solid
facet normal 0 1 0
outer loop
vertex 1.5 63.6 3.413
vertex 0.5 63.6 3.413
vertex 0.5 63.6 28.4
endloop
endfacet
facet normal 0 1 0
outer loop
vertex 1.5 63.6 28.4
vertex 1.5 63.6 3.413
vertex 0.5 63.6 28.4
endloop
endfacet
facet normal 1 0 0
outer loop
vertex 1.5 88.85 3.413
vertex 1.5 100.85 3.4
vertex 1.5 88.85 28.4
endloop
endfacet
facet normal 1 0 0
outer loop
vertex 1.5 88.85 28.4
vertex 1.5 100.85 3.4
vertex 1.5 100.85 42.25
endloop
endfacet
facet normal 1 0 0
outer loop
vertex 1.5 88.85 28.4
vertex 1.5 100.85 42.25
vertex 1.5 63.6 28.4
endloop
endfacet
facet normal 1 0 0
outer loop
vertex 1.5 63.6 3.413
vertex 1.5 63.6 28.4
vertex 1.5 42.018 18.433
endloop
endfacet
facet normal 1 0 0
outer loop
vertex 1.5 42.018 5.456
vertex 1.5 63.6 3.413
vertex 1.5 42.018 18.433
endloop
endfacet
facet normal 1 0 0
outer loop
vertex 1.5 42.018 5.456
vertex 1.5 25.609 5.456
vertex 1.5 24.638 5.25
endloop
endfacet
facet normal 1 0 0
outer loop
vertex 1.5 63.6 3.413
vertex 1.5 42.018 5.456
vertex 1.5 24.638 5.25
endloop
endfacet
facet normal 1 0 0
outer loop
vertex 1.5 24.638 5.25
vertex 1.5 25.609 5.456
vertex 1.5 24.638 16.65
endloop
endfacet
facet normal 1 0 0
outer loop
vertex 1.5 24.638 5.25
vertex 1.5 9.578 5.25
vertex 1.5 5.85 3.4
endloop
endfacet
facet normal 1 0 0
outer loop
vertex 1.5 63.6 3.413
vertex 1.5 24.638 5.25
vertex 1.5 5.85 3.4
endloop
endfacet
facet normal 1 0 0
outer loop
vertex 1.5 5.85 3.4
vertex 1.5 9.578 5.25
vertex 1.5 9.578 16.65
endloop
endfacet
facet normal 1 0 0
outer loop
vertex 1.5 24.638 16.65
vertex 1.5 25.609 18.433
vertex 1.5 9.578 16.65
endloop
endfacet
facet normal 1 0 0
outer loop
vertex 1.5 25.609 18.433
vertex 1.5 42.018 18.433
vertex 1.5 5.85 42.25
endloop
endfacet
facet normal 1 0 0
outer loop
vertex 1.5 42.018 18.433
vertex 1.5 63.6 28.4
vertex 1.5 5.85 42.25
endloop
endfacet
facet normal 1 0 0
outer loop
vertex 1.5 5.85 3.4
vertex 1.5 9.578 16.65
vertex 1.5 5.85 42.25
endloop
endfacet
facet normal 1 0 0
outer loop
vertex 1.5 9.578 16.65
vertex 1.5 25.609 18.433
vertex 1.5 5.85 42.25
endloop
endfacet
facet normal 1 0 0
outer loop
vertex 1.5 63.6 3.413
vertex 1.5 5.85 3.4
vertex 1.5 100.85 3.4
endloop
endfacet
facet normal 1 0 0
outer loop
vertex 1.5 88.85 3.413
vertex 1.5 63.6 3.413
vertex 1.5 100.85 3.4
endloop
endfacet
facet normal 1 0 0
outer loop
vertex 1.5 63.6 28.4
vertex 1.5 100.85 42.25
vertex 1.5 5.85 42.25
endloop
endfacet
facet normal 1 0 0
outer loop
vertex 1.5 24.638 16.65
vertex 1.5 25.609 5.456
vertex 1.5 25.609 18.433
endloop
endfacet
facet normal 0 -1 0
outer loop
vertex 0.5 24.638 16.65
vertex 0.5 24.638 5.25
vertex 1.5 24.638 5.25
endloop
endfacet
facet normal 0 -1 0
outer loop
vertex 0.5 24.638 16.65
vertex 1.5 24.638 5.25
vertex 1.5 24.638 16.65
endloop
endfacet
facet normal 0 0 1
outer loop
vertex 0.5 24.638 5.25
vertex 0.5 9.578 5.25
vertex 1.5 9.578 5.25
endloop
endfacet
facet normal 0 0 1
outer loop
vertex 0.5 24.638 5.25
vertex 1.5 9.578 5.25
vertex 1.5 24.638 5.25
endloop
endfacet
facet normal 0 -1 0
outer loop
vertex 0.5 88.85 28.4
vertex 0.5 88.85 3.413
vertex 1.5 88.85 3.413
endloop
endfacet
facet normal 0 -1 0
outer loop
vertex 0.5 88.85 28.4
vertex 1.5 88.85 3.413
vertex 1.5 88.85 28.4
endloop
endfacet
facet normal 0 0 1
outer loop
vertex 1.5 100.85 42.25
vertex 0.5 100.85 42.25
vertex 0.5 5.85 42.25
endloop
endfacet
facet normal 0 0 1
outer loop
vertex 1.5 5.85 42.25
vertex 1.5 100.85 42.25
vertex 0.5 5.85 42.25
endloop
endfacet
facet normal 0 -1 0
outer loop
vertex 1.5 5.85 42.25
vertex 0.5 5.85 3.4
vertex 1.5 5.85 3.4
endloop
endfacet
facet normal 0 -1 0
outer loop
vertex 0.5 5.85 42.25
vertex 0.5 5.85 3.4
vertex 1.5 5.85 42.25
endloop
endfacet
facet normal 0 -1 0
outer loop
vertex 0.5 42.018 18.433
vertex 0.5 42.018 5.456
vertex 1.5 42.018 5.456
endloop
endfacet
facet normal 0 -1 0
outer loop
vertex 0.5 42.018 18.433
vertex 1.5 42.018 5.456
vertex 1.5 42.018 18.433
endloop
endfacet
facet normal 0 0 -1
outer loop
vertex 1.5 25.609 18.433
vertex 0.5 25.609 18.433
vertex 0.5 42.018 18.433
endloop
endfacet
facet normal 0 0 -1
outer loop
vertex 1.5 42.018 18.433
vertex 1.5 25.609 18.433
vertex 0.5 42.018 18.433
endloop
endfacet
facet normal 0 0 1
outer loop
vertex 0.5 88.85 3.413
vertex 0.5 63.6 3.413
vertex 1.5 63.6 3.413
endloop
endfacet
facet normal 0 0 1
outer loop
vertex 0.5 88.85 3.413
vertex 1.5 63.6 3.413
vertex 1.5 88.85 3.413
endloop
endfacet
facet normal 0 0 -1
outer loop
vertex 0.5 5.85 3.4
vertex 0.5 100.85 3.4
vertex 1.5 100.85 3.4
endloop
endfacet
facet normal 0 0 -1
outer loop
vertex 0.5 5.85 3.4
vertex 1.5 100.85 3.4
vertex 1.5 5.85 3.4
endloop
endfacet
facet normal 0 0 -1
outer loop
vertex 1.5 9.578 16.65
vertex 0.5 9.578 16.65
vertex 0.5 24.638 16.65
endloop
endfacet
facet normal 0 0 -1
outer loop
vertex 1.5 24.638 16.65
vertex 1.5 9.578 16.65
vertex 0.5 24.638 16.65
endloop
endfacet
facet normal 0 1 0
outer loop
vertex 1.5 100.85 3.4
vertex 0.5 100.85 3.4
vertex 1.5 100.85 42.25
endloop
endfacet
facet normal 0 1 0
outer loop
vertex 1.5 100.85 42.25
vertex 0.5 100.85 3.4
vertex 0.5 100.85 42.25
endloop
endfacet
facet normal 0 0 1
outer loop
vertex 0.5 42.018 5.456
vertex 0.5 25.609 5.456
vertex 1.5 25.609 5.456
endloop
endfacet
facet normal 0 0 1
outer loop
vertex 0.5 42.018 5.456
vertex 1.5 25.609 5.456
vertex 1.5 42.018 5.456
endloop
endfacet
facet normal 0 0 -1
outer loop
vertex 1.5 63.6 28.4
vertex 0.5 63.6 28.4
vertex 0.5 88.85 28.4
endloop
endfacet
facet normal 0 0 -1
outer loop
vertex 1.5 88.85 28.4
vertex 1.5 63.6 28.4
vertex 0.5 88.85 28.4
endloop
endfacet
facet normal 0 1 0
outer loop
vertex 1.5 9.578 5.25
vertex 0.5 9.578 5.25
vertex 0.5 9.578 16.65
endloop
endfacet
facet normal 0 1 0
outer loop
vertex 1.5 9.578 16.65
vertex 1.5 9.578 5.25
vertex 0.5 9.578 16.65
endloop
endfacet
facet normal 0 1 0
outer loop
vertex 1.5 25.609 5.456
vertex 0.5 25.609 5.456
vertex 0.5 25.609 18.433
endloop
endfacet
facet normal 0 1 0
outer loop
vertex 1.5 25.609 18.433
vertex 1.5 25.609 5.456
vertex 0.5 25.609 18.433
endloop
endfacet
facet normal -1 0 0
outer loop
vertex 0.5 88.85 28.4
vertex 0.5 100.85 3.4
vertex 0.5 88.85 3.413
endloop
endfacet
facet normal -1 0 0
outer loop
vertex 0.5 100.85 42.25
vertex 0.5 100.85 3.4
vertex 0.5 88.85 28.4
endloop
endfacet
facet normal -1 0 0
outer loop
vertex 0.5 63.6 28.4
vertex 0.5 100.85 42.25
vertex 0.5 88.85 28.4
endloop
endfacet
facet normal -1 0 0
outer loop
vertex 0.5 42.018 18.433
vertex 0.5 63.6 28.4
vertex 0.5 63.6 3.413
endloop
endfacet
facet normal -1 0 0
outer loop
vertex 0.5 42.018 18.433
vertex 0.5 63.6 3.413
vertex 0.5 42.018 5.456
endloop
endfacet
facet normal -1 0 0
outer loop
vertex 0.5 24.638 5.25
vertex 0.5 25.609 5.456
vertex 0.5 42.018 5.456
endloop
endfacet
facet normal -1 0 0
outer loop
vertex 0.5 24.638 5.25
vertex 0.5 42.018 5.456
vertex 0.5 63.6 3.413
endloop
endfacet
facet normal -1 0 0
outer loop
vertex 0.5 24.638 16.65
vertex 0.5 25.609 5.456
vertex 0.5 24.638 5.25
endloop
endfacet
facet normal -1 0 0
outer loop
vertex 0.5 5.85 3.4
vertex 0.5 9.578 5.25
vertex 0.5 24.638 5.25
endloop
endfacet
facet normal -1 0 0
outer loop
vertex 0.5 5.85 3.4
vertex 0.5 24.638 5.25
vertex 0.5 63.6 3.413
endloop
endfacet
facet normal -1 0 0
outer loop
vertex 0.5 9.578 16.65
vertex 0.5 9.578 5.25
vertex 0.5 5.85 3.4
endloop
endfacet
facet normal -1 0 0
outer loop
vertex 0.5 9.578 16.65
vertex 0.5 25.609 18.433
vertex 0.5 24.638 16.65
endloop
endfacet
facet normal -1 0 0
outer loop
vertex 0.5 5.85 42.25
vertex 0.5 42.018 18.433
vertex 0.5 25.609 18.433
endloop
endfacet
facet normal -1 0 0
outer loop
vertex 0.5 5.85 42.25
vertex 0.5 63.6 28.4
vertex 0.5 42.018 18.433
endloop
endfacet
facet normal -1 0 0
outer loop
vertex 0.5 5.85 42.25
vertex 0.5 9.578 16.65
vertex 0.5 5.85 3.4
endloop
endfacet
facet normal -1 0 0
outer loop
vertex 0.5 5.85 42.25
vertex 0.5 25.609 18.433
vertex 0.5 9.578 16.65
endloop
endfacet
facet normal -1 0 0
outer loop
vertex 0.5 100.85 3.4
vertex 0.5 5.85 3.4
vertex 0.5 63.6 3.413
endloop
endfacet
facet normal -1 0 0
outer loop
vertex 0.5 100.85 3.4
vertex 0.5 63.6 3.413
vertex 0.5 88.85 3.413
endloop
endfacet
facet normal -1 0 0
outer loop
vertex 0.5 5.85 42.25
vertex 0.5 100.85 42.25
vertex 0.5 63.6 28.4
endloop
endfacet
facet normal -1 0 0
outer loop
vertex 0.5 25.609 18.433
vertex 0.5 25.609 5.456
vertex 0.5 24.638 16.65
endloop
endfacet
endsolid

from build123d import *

# Parameters (mm, degrees)
SKETCH_1_W          = 95
SKETCH_1_H          = 38.85
EXTRUDE_1_DEPTH     = 1
SKETCH_2_W          = 11.4
SKETCH_2_H          = 15.06
SKETCH_2_W_2        = 24.986714953
SKETCH_2_H_2        = 25.25
SKETCH_2_W_3        = 12.976860002
SKETCH_2_H_3        = 16.4084
CUT_EXTRUDE_1_DEPTH = 10


with BuildPart() as part:
    # Эскиз1 → Бобышка-Вытянуть1 (new body)
    with BuildSketch(Plane(origin=(0.5, 0, 0), x_dir=(0, -1, 0), z_dir=(-1, 0, 0))):
        with Locations((-53.35, 22.825)):
            Rectangle(SKETCH_1_W, SKETCH_1_H)
    extrude(amount=-EXTRUDE_1_DEPTH)

    # Эскиз2 → Вырез-Вытянуть1 (cut)
    with BuildSketch(Plane.ZY.offset(-0.5)):
        with Locations((10.95, 17.108135831)):
            Rectangle(SKETCH_2_W, SKETCH_2_H)
        with Locations((15.906642524, 76.225)):
            Rectangle(SKETCH_2_W_2, SKETCH_2_H_2)
        with Locations((11.944169999, 33.813361354)):
            Rectangle(SKETCH_2_W_3, SKETCH_2_H_3)
    extrude(amount=-CUT_EXTRUDE_1_DEPTH, mode=Mode.SUBTRACT)


solid = part.part
